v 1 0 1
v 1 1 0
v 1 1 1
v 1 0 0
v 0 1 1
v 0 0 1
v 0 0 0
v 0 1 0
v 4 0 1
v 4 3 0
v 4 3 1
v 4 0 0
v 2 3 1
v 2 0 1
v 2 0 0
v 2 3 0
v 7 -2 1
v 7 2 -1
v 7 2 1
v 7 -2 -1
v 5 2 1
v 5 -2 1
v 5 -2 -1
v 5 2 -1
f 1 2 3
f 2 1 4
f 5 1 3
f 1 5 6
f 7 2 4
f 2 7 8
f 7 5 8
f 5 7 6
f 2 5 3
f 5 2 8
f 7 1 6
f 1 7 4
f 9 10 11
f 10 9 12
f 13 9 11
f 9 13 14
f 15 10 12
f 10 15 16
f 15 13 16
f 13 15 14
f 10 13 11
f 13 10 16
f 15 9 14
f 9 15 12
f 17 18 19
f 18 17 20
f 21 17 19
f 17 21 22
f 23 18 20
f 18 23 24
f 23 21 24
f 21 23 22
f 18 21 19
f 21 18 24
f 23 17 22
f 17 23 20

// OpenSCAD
// Volume: 23, SurfaceArea: 68
cube();
cube([1,1,0]); cube([1,0,1]); cube([0,1,1]); cube([0,0,0]);
translate([2,0,0]) cube([2,3,1]);
translate([6,0,0]) cube([2,4,2], center=true);
